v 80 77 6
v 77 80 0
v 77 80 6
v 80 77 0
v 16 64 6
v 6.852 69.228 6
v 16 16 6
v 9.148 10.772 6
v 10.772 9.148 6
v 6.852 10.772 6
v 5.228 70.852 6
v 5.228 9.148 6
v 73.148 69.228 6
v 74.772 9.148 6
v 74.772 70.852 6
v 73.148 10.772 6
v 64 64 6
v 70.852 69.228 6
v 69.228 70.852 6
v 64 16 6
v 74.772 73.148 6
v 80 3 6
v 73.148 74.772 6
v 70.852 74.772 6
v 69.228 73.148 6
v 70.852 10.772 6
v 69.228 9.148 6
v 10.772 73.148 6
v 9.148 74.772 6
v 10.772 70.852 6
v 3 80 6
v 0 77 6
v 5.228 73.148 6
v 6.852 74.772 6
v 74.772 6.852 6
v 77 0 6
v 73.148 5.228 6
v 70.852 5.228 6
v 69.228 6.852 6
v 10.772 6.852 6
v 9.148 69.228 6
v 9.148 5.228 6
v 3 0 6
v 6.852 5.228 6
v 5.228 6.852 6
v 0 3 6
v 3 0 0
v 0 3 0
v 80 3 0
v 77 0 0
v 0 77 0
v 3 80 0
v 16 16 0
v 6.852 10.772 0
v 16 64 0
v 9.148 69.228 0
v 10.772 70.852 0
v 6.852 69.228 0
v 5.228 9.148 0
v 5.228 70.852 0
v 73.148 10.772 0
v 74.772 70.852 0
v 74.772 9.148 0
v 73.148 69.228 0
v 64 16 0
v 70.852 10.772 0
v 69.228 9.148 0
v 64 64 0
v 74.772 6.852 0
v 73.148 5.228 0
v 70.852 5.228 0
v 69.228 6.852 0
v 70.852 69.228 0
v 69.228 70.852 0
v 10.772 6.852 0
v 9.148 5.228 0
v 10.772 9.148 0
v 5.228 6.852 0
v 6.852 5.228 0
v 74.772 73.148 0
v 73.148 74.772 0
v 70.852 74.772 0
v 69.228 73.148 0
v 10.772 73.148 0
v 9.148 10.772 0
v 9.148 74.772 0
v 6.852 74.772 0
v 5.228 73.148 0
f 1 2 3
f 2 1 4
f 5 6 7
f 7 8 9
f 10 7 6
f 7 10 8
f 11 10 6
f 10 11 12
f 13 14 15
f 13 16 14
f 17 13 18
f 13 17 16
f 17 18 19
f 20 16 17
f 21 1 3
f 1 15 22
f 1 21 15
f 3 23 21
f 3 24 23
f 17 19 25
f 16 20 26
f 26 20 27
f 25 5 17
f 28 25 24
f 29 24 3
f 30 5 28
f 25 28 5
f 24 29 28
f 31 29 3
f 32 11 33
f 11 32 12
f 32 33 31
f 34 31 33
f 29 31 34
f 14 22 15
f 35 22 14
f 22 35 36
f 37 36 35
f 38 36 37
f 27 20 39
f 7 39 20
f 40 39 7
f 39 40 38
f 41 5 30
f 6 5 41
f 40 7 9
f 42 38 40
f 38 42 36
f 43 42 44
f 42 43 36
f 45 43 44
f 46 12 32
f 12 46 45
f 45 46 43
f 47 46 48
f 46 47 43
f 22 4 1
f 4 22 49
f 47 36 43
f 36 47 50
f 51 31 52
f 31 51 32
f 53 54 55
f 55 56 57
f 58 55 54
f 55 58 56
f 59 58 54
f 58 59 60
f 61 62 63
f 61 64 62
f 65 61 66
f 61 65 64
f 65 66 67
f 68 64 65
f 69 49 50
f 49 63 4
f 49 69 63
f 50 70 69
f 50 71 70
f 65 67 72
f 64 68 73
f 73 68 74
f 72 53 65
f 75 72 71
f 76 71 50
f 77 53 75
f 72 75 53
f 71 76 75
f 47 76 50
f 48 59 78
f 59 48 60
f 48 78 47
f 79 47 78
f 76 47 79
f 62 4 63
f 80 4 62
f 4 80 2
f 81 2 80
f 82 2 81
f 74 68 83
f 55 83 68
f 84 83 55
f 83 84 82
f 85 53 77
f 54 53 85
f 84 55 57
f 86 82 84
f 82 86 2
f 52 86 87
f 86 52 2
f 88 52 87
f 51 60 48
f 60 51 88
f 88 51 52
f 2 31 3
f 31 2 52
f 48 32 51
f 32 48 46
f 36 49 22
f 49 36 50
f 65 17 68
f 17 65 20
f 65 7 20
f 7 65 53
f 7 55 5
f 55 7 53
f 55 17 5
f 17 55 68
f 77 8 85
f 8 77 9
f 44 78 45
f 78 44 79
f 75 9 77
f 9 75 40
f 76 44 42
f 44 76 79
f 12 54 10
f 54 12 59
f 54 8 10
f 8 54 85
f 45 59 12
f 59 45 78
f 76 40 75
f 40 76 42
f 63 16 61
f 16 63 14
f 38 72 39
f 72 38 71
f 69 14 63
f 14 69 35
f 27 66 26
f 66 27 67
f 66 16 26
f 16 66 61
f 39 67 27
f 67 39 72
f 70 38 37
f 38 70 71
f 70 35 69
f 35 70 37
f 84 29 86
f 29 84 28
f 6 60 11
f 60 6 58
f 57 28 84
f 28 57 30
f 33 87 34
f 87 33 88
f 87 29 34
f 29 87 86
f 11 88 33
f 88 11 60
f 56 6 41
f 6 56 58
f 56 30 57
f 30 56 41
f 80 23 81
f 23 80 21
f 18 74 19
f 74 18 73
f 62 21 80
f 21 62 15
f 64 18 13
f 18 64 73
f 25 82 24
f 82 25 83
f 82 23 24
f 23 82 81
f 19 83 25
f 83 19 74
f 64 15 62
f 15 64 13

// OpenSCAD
$fn = 32;

// ----------------------------------------------------------------------
// Frame plate: 80 x 80 frame, 16 mm rails
// ----------------------------------------------------------------------

// --- parameters (mm) ---
plate_l = 80;             // plate length, X
plate_w = 80;             // plate width, Y
plate_t = 6;              // plate thickness, Z (extrusion height)
corner_c = 3;             // corner chamfer
frame_bar = 16;           // frame rail width
bolt_r = 3;               // corner bolt window radius
bolt_inset = 8;           // bolt centre inset from the edges

win_l = plate_l - 2 * frame_bar;  // window length
win_w = plate_w - 2 * frame_bar;  // window width
bolt_d = 2 * bolt_r;  // corner hole diameter

profile = [[3, 0], [77, 0], [80, 3], [80, 77], [77, 80], [3, 80], [0, 77], [0, 3]];  // primary outline, 8 points, counter clockwise
void_1 = [[16, 16], [64, 16], [64, 64], [16, 64]];  // the window, 4 points
void_2 = [[10.772, 9.148], [9.148, 10.772], [6.852, 10.772], [5.228, 9.148], [5.228, 6.852], [6.852, 5.228], [9.148, 5.228], [10.772, 6.852]];  // corner bolt window, 8 points
void_3 = [[74.772, 9.148], [73.148, 10.772], [70.852, 10.772], [69.228, 9.148], [69.228, 6.852], [70.852, 5.228], [73.148, 5.228], [74.772, 6.852]];  // corner bolt window, 8 points
void_4 = [[10.772, 73.148], [9.148, 74.772], [6.852, 74.772], [5.228, 73.148], [5.228, 70.852], [6.852, 69.228], [9.148, 69.228], [10.772, 70.852]];  // corner bolt window, 8 points
void_5 = [[74.772, 73.148], [73.148, 74.772], [70.852, 74.772], [69.228, 73.148], [69.228, 70.852], [70.852, 69.228], [73.148, 69.228], [74.772, 70.852]];  // corner bolt window, 8 points

// --- the one profile operation ---
difference() {
  linear_extrude(height = plate_t) polygon(points = profile);
  translate([0, 0, -1])
    linear_extrude(height = plate_t + 2) polygon(points = void_1);
  translate([0, 0, -1])
    linear_extrude(height = plate_t + 2) polygon(points = void_2);
  translate([0, 0, -1])
    linear_extrude(height = plate_t + 2) polygon(points = void_3);
  translate([0, 0, -1])
    linear_extrude(height = plate_t + 2) polygon(points = void_4);
  translate([0, 0, -1])
    linear_extrude(height = plate_t + 2) polygon(points = void_5);
}
